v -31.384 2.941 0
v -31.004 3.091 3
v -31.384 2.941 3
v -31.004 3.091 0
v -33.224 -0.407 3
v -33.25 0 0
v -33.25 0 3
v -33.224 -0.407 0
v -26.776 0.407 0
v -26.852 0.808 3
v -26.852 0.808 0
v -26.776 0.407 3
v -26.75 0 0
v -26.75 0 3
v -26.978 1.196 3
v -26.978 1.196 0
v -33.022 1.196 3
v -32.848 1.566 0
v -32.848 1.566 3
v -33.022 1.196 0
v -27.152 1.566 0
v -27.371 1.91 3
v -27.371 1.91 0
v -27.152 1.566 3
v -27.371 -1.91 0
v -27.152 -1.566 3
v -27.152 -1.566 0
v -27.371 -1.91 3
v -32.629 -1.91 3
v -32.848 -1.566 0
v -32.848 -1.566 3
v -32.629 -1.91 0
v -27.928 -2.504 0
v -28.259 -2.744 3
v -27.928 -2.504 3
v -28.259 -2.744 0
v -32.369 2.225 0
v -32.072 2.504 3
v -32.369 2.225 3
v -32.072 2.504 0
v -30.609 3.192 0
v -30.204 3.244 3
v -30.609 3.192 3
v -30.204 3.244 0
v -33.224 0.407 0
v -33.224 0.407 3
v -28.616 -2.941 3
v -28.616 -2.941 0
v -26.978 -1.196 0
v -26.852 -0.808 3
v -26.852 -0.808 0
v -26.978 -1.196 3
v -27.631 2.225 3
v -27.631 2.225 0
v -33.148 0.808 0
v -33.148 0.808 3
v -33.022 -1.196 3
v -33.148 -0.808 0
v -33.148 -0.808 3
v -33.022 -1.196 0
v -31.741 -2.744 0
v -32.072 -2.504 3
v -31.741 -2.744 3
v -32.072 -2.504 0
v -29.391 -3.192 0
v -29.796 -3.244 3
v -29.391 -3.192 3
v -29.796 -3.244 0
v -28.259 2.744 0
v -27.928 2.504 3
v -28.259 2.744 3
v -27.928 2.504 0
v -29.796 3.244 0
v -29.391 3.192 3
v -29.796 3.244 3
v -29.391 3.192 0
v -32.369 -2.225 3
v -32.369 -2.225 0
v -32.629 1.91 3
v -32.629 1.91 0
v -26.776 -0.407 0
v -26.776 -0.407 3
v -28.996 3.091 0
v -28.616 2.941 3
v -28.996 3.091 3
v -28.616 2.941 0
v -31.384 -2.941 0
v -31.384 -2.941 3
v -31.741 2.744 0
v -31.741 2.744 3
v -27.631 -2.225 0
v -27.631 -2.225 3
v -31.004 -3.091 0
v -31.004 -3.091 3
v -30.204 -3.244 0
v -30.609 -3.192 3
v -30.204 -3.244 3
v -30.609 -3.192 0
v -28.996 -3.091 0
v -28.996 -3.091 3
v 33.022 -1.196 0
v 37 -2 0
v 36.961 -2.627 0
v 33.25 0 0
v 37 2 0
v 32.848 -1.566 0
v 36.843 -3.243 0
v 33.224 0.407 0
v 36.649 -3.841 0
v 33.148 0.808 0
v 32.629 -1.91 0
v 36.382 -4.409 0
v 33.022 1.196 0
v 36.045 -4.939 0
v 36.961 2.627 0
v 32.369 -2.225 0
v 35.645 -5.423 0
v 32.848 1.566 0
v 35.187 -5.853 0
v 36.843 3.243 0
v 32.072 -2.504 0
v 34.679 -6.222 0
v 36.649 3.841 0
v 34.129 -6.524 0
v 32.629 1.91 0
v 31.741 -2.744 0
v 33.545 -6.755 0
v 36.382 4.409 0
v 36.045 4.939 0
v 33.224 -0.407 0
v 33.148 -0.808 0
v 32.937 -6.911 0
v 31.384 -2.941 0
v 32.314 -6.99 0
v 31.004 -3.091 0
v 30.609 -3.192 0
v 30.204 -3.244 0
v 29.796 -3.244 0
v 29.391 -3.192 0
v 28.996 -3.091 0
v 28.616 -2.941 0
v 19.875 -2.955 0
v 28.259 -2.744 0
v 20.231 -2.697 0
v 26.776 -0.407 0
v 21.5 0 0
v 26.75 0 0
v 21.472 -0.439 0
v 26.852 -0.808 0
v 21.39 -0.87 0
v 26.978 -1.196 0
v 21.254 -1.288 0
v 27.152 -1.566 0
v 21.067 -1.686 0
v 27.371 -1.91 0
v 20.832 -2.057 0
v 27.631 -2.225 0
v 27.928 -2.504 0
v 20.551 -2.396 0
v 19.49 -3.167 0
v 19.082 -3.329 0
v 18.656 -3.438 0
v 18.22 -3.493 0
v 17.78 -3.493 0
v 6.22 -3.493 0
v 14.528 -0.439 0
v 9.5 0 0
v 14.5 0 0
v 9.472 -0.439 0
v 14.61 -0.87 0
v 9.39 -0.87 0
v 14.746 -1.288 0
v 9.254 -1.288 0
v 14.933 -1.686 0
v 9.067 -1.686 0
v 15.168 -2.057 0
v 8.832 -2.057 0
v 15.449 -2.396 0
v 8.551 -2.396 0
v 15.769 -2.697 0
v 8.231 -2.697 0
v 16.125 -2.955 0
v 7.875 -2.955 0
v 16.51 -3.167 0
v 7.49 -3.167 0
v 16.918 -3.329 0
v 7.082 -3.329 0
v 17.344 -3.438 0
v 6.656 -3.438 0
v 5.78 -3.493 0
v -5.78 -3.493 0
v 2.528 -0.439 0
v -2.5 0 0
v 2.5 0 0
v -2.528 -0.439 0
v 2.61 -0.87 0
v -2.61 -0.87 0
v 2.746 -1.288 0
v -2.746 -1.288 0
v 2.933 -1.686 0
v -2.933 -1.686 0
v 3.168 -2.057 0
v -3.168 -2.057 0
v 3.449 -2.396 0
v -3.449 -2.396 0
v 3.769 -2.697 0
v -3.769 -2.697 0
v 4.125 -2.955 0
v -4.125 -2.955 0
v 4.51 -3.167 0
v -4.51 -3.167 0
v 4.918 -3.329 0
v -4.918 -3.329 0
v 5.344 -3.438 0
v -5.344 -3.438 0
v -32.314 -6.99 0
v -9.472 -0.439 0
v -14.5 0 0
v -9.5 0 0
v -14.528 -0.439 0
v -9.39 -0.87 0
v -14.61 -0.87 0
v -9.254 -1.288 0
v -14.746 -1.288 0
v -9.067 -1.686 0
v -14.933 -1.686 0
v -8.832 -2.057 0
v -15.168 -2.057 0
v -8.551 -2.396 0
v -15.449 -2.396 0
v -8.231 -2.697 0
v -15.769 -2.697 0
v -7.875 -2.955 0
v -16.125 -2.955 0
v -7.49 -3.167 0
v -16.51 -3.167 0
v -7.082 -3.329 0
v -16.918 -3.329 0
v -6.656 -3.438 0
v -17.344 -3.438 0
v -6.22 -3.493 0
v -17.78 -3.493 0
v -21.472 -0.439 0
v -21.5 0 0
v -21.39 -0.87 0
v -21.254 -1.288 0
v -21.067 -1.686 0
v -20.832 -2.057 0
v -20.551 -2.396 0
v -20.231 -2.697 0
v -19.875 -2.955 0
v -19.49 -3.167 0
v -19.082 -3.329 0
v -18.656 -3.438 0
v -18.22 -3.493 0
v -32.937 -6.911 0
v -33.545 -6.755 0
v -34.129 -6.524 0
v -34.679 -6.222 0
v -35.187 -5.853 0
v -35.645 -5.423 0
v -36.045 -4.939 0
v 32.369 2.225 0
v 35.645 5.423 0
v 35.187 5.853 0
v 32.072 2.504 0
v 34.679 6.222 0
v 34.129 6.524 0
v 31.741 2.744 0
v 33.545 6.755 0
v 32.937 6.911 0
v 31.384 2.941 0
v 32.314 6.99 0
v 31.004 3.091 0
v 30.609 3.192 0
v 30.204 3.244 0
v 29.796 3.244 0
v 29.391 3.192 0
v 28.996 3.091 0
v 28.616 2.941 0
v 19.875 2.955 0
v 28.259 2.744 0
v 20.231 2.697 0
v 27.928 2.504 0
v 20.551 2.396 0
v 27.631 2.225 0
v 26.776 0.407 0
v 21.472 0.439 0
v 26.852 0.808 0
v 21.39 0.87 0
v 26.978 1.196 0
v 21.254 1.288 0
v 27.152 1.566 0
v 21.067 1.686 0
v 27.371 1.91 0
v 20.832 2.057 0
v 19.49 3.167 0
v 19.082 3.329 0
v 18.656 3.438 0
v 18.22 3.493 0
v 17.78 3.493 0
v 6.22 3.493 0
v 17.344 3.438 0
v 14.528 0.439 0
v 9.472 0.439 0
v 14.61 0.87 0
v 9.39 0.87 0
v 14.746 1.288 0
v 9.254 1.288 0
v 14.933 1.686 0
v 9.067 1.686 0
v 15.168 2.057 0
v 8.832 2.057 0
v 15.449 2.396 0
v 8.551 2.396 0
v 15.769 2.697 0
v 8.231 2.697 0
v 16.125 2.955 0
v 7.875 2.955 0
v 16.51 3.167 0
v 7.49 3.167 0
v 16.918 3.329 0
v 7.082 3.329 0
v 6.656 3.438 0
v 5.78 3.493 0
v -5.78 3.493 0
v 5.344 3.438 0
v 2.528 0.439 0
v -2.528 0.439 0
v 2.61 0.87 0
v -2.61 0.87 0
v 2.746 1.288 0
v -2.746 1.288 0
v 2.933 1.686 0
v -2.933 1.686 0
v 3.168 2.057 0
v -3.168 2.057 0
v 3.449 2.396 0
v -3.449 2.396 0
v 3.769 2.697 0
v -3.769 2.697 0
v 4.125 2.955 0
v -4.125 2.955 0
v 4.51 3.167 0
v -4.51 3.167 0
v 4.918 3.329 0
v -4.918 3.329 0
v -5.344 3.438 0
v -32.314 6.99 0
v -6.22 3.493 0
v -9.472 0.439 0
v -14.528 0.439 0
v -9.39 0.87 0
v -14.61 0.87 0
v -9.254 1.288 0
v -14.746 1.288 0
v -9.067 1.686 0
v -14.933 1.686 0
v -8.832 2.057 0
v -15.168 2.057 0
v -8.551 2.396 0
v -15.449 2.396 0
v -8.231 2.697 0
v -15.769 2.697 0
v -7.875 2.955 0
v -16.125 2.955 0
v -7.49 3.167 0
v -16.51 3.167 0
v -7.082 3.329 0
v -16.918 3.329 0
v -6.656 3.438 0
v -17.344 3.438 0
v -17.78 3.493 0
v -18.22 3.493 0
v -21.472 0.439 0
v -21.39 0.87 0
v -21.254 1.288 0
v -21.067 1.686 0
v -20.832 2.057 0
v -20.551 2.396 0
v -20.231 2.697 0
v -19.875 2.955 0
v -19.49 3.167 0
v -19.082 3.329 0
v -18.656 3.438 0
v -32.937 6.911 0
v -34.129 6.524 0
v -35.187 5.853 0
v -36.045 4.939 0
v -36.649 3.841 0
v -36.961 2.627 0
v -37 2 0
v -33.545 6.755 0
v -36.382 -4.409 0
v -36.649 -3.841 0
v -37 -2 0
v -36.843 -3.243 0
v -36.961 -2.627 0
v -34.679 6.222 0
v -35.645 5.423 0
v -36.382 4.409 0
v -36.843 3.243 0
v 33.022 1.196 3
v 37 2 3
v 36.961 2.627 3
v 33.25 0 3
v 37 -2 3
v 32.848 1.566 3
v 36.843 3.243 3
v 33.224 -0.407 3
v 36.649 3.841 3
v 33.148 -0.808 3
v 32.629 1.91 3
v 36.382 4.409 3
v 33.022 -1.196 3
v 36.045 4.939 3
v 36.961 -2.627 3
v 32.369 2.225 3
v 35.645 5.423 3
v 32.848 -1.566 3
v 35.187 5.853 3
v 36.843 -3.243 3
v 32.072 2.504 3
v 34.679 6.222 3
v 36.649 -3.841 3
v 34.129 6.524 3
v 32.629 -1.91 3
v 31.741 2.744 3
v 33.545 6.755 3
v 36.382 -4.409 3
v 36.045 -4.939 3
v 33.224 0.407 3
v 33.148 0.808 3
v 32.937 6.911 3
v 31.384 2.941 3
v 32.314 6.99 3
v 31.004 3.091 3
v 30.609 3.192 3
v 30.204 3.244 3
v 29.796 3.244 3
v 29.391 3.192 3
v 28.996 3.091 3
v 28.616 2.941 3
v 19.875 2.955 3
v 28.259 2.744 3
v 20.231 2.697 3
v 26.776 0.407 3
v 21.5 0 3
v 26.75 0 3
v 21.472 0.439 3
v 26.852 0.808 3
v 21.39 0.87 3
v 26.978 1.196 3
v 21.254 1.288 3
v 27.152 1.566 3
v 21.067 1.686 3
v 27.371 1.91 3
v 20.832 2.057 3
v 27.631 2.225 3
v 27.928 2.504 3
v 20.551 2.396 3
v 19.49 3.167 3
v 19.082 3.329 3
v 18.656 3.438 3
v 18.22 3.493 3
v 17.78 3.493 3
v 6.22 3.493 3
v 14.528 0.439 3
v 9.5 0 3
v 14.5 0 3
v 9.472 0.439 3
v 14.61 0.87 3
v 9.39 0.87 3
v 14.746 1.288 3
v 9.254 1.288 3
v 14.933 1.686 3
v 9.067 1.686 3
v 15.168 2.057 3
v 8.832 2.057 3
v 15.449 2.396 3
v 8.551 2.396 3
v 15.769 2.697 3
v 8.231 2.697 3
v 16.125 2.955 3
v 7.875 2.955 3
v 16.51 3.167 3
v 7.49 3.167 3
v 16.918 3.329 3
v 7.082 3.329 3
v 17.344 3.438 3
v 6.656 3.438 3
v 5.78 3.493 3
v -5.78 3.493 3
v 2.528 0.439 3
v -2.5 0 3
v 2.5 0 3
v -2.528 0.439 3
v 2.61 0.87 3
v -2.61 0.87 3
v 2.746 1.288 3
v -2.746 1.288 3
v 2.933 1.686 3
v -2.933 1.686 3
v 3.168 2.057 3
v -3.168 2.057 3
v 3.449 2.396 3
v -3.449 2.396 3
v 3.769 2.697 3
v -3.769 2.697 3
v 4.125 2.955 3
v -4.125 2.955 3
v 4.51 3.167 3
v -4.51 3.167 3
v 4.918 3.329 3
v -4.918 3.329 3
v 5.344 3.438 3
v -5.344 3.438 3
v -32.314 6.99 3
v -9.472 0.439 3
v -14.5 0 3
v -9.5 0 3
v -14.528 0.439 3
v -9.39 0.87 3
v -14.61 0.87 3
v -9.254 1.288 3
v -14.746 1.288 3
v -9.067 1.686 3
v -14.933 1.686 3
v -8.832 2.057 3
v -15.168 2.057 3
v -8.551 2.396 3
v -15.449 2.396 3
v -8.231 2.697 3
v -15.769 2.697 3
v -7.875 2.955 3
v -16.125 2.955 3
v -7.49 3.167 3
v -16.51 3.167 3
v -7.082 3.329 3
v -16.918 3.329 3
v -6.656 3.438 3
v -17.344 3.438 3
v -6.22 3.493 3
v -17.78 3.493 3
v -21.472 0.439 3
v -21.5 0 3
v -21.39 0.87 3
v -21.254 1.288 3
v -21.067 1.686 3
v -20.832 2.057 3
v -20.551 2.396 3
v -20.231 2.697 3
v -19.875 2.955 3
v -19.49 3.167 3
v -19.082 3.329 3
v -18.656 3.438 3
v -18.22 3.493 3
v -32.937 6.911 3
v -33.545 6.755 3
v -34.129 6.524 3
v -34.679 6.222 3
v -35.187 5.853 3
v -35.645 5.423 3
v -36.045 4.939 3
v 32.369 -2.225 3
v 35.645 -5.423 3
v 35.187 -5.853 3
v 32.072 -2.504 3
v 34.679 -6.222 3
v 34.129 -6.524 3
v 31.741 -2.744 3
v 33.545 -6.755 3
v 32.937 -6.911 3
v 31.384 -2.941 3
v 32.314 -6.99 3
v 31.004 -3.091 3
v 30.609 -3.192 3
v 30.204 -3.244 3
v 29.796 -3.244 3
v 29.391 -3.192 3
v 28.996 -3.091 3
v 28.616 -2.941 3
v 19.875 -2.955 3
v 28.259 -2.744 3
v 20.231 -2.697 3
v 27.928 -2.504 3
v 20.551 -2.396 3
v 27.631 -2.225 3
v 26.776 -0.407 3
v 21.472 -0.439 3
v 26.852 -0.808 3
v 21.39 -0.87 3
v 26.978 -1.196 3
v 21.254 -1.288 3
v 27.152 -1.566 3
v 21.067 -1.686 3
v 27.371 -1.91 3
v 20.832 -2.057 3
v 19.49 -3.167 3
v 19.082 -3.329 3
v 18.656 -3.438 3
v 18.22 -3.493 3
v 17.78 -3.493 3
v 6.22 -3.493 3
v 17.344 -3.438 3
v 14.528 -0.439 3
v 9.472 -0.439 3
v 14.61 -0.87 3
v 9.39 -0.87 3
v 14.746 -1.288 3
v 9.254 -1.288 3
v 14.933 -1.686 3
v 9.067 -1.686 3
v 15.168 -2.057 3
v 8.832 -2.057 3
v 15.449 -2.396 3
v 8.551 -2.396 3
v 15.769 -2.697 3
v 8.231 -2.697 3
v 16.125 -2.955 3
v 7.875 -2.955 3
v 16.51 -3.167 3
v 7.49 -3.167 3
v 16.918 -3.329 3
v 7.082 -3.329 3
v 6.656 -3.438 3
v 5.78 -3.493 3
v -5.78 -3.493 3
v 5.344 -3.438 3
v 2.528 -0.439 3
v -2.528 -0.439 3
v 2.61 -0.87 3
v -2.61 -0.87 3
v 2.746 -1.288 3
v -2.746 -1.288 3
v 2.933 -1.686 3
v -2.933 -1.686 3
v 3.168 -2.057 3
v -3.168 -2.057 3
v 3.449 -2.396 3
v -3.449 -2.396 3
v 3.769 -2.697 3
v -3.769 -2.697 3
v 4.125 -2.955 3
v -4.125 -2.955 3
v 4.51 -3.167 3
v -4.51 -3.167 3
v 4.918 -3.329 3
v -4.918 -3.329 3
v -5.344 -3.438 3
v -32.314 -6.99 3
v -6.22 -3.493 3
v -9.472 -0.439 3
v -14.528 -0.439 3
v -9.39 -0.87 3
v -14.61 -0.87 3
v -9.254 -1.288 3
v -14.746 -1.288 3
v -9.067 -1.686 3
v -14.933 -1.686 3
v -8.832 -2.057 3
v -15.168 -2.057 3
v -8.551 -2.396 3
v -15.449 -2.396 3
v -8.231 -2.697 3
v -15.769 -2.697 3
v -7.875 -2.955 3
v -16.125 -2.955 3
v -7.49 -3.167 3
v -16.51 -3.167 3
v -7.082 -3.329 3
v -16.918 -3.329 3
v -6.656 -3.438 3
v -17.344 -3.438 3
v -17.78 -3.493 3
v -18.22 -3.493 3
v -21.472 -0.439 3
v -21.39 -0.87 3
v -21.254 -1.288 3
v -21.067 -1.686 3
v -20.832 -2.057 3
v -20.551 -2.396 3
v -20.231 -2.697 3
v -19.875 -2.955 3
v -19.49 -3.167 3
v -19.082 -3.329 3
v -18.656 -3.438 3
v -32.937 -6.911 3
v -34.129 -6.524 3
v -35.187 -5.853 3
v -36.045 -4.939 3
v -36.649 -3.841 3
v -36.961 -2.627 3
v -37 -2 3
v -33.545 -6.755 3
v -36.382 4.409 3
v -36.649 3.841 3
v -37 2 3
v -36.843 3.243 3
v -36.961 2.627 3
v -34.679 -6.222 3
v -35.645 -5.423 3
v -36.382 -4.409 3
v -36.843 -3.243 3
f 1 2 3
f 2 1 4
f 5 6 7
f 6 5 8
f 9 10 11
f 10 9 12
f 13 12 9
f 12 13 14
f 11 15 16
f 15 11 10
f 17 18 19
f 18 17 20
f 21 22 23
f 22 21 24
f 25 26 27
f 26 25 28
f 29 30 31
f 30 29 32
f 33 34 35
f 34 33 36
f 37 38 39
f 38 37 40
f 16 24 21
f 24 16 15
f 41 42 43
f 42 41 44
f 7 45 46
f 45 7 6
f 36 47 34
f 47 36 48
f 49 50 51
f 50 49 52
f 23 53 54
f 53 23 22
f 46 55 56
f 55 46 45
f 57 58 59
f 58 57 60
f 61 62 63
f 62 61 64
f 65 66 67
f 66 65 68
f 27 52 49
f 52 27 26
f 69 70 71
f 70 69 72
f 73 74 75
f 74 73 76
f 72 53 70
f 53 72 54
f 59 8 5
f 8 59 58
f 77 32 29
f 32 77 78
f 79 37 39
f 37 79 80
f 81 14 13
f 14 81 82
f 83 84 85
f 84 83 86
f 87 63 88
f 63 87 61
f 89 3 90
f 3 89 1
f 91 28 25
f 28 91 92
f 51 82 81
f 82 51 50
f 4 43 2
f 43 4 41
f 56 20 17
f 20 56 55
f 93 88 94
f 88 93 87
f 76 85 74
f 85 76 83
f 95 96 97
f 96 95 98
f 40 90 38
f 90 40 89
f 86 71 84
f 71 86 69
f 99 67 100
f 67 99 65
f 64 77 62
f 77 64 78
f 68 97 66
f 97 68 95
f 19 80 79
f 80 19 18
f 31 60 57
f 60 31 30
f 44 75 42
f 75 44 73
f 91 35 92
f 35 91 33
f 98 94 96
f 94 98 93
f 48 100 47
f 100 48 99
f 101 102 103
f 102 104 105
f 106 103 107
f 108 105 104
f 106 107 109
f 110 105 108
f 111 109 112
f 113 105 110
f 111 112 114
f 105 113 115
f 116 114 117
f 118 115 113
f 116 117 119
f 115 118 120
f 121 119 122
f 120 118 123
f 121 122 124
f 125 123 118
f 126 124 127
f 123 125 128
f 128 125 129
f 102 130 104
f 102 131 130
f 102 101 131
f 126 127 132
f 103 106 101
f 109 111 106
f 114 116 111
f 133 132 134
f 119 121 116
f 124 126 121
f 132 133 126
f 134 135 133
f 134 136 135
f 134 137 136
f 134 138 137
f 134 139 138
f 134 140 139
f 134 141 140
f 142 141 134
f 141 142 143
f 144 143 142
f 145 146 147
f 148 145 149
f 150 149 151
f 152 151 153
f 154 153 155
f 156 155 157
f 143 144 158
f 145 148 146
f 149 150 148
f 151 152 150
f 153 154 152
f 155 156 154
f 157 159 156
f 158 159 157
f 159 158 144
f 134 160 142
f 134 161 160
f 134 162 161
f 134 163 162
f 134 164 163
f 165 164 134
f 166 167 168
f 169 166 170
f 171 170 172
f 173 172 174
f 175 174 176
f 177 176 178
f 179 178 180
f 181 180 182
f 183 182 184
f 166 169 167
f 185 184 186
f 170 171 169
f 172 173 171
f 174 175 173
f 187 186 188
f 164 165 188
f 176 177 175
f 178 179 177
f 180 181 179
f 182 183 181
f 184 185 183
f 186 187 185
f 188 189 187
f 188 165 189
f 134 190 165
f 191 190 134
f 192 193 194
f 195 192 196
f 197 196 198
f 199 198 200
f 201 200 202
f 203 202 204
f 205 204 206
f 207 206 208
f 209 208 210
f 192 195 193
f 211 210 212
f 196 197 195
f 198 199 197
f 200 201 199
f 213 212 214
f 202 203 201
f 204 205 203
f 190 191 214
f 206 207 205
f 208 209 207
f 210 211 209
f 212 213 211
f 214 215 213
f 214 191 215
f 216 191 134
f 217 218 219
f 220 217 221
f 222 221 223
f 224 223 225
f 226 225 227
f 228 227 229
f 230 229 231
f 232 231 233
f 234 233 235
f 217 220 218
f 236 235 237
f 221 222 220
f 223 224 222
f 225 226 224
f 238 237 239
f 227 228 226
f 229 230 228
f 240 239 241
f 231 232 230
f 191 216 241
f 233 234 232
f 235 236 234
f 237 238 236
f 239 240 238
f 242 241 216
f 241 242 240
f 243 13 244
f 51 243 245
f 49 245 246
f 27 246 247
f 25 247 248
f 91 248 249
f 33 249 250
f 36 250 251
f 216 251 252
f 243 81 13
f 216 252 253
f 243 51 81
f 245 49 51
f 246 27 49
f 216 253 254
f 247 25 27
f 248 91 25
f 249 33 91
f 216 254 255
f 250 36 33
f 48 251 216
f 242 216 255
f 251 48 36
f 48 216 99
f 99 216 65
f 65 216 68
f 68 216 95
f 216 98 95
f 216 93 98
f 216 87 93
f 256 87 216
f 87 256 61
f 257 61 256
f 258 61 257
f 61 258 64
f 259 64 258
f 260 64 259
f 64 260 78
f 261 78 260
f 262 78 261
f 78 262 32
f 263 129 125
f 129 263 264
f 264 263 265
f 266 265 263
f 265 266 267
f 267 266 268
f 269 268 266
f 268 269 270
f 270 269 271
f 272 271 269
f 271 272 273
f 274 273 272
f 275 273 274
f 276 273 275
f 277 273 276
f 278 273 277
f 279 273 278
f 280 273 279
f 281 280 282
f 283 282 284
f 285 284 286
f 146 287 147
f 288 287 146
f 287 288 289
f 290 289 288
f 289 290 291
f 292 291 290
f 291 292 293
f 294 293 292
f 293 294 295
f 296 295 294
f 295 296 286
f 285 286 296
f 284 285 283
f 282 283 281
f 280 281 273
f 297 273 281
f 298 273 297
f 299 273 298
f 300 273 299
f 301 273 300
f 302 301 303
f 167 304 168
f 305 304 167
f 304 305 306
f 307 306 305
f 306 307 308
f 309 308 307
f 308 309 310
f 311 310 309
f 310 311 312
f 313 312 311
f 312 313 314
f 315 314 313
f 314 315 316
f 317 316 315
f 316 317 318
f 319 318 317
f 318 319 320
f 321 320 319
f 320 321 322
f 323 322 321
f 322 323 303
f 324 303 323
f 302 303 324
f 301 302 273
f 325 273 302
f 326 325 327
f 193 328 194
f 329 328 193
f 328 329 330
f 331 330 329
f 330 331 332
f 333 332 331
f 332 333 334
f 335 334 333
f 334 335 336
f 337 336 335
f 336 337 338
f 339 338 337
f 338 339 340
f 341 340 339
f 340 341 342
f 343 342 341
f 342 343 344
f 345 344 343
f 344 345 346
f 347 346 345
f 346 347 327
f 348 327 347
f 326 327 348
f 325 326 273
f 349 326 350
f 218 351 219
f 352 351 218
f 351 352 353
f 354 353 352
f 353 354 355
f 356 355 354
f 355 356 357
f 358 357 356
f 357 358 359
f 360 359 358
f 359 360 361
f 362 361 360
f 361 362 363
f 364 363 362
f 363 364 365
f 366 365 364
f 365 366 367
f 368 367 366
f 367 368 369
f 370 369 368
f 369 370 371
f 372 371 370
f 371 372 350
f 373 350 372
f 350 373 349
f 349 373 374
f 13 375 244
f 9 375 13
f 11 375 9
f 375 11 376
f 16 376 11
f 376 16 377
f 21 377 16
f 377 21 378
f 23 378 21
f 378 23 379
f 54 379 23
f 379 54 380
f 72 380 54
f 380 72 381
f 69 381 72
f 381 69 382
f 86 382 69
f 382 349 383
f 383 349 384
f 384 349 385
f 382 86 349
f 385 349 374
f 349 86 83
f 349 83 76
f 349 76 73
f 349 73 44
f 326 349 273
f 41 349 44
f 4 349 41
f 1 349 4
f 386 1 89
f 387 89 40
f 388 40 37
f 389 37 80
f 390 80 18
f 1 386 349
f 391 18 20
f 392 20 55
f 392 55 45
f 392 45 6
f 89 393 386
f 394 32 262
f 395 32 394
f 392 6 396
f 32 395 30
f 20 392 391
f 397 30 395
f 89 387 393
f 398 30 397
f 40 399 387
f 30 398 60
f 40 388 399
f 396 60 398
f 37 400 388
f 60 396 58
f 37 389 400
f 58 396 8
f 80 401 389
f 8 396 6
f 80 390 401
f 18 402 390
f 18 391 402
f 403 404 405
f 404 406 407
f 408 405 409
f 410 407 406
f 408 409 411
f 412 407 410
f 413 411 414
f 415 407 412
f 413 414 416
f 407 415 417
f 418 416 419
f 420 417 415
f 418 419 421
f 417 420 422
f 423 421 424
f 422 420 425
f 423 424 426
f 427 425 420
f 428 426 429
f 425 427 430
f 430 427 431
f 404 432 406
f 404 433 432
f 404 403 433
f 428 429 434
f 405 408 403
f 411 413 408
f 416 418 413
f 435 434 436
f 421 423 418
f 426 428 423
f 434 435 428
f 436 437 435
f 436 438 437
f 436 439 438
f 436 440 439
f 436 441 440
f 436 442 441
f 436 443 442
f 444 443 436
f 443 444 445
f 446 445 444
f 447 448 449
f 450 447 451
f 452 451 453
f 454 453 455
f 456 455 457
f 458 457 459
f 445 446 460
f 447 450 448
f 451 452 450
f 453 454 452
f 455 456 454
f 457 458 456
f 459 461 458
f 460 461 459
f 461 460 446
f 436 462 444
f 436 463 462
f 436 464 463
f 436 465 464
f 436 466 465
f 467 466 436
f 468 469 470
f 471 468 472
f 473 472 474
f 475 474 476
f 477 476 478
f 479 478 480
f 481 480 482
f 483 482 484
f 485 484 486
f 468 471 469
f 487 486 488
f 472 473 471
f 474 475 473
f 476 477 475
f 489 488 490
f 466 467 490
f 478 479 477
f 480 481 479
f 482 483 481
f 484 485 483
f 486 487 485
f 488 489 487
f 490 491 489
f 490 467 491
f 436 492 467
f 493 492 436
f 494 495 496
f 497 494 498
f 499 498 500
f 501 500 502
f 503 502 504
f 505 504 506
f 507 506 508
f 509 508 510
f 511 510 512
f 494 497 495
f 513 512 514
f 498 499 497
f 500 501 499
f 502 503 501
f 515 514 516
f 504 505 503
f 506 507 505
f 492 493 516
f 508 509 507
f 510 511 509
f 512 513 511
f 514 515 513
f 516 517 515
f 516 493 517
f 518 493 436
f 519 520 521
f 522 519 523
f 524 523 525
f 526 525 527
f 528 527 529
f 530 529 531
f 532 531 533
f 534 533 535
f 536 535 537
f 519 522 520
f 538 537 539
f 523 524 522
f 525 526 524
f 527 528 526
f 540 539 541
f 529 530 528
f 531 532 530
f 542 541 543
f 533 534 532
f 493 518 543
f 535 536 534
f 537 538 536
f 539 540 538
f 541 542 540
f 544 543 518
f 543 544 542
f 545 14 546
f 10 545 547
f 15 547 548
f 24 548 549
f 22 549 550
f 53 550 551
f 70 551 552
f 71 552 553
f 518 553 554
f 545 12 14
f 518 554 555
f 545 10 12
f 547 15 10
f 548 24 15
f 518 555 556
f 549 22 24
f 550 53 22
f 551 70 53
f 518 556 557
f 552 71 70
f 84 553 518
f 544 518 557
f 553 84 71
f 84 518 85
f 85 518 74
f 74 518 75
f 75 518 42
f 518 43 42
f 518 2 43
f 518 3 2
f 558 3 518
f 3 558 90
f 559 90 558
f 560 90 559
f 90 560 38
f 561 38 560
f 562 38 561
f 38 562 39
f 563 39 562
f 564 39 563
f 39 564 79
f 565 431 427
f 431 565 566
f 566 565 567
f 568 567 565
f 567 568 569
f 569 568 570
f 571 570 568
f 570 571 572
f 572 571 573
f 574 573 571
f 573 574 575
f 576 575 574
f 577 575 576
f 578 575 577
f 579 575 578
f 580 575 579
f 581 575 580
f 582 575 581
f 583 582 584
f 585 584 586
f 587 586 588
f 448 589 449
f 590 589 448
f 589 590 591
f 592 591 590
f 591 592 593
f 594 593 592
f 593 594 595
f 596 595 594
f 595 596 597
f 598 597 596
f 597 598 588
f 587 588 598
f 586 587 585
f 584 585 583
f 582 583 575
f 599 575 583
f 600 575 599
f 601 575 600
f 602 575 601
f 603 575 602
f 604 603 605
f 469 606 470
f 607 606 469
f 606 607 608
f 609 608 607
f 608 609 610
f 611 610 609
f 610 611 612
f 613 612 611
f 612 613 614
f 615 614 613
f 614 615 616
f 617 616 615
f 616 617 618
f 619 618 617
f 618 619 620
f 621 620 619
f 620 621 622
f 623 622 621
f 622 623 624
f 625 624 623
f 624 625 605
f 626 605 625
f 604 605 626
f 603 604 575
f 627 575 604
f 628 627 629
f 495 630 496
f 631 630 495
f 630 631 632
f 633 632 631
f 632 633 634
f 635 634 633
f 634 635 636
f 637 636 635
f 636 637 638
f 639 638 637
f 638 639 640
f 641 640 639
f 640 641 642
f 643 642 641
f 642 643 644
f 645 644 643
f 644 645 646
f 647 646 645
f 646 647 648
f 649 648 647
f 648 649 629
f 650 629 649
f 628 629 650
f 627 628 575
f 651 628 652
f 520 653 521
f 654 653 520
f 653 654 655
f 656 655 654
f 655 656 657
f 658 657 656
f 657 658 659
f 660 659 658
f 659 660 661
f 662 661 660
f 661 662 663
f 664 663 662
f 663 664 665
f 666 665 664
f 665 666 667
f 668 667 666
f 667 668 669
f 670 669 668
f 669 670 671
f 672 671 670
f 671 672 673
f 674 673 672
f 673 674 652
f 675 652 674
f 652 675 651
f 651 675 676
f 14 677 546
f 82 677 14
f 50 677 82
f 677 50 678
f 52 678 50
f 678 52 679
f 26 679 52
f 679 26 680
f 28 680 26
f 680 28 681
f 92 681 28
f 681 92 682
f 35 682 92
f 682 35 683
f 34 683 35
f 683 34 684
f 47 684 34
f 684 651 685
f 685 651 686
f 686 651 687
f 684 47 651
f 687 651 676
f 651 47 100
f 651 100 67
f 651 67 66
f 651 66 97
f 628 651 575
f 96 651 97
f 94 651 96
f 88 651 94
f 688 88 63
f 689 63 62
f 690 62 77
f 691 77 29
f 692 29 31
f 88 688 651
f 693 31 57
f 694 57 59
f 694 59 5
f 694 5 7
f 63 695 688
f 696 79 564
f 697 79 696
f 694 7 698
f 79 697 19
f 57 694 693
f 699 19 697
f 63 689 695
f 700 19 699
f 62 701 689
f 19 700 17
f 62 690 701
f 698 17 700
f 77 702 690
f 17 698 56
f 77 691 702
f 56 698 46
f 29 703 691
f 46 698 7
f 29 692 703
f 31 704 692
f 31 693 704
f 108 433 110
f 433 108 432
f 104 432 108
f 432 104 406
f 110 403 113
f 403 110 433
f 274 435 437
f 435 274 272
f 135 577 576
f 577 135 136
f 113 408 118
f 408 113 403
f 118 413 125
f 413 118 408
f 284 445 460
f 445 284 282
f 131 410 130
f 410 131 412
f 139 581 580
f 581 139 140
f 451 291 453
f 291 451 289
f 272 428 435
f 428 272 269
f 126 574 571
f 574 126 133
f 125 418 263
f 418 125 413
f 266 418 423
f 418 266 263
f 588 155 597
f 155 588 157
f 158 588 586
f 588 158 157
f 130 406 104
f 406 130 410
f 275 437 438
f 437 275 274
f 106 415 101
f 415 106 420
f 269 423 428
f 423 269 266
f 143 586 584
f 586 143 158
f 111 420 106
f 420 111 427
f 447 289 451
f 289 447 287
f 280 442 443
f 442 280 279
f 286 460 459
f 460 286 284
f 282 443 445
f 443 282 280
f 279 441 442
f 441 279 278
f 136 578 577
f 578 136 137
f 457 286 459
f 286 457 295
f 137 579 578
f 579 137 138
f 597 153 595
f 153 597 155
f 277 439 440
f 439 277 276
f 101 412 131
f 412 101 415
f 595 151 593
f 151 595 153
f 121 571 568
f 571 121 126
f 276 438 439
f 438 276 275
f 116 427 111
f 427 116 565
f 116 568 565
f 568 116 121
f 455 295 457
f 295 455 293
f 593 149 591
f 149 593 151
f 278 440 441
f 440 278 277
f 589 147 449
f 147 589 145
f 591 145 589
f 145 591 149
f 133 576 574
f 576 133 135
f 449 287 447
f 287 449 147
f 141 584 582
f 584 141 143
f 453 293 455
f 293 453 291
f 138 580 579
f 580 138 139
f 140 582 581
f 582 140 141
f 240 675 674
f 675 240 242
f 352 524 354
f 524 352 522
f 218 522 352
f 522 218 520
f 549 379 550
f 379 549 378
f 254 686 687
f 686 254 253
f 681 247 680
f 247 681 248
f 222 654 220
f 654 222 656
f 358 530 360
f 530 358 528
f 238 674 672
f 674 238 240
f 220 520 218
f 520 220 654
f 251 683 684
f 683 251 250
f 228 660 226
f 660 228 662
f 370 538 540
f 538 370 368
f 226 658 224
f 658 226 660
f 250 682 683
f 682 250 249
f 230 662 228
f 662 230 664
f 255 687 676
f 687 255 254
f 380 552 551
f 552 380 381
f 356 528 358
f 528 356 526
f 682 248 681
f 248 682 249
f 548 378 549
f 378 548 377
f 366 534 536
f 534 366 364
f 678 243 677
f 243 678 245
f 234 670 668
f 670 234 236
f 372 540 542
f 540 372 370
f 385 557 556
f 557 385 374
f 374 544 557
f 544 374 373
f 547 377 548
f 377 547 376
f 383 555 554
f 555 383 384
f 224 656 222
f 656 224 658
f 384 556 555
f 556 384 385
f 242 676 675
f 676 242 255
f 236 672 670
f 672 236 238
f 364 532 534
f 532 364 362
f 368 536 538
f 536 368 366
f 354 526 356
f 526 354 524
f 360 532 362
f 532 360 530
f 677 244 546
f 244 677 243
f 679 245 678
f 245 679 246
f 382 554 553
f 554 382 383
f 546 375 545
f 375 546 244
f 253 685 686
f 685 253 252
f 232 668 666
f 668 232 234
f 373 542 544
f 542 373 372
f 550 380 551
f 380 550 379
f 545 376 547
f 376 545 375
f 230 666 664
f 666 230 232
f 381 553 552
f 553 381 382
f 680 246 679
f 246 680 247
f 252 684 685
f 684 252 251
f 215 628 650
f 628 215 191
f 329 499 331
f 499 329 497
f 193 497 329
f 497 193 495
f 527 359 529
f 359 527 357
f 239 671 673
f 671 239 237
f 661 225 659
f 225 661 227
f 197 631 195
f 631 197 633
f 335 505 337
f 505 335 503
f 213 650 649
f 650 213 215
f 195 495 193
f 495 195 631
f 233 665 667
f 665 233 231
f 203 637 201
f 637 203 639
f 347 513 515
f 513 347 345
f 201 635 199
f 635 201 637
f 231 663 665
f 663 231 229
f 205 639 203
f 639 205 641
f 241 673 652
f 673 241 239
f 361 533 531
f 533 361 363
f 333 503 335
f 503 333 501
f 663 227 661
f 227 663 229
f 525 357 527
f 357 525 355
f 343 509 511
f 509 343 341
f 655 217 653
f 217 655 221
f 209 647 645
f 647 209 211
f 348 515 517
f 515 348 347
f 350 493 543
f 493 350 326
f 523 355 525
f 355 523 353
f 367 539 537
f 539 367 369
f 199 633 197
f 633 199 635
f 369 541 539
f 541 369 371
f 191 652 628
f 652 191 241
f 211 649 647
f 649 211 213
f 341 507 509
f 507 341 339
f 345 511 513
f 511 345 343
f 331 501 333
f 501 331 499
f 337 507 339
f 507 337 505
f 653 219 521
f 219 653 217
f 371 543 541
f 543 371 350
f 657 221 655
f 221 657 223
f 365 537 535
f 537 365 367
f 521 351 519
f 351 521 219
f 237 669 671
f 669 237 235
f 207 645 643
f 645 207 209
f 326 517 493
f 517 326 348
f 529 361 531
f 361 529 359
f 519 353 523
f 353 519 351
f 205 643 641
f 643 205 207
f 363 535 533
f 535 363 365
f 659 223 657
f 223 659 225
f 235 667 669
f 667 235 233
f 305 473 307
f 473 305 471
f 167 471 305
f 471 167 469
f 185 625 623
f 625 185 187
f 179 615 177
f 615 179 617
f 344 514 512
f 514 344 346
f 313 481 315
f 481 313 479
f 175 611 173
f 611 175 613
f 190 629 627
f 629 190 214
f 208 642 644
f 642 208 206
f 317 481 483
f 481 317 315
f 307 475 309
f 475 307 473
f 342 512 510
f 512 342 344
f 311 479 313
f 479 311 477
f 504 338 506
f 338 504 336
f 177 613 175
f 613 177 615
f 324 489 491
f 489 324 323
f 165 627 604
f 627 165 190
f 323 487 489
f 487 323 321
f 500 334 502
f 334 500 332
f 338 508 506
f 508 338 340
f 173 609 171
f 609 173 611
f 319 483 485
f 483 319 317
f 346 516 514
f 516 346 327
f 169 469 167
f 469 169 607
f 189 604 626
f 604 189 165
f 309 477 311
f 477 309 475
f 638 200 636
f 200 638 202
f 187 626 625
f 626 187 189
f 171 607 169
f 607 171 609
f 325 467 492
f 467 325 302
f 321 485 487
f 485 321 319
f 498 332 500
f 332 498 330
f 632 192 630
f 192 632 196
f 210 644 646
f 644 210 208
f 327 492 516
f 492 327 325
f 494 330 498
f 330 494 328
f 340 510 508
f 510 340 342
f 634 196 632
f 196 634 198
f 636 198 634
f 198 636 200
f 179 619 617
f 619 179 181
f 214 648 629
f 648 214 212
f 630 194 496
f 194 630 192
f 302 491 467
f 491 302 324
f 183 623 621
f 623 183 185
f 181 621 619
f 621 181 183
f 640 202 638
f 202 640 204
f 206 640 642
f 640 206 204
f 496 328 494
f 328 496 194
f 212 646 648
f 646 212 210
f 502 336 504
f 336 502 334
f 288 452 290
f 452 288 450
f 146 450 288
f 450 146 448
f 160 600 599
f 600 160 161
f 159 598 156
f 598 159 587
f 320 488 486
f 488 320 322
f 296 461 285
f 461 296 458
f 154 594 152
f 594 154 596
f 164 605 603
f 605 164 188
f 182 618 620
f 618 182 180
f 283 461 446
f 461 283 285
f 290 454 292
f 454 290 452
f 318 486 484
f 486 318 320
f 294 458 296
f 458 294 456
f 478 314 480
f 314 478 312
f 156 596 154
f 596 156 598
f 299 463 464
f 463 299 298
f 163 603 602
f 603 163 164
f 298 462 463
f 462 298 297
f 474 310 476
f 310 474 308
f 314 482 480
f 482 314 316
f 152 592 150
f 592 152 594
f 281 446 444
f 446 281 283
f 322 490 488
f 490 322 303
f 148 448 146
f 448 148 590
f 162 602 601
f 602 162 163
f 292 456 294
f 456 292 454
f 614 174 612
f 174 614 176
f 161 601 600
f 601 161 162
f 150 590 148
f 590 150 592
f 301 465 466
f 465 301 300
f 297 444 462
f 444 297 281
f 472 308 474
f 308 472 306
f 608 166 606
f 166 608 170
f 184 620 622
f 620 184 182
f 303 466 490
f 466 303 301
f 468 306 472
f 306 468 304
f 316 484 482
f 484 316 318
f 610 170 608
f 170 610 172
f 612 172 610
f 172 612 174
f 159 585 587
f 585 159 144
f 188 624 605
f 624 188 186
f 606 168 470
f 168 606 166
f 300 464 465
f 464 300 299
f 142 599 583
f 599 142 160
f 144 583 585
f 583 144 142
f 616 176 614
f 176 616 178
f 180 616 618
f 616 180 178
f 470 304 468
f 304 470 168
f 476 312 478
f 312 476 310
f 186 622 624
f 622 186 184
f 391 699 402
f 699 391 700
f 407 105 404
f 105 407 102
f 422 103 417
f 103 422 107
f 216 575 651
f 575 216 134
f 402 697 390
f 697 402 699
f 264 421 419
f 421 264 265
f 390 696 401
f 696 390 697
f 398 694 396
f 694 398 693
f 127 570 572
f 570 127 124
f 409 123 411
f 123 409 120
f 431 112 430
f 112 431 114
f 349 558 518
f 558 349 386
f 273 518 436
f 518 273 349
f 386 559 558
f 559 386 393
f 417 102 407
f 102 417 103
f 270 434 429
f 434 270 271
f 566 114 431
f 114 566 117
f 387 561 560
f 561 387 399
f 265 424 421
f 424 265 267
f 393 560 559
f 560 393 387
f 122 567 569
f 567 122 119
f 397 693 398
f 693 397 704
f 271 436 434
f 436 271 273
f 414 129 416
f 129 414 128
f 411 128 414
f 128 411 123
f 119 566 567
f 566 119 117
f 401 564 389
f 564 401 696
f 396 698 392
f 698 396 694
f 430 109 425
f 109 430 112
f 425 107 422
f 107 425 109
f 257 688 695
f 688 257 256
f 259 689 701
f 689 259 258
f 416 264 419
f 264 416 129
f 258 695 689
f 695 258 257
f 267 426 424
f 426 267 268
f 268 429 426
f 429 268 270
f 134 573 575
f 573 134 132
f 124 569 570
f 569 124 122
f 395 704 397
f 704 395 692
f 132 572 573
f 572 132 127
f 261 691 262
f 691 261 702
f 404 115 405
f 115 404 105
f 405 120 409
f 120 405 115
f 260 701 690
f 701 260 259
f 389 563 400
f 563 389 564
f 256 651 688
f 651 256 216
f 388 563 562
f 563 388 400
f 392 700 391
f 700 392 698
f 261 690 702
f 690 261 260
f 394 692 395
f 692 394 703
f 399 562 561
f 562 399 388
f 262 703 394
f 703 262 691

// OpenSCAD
$fn = 50;

difference() {
	union() {
		hull() {
			translate(v = [-32.0, 2.0, 0]) {
				cylinder(h = 3, r = 5);
			}
			translate(v = [32.0, 2.0, 0]) {
				cylinder(h = 3, r = 5);
			}
			translate(v = [-32.0, -2.0, 0]) {
				cylinder(h = 3, r = 5);
			}
			translate(v = [32.0, -2.0, 0]) {
				cylinder(h = 3, r = 5);
			}
		}
	}
	union() {
		translate(v = [-30.0, 0.0, 0]) {
			cylinder(h = 3, r = 3.25);
		}
		translate(v = [30.0, 0.0, 0]) {
			cylinder(h = 3, r = 3.25);
		}
		translate(v = [-18.0, 0, 0.0]) {
			cylinder(h = 3, r = 3.5);
		}
		translate(v = [-6.0, 0, 0.0]) {
			cylinder(h = 3, r = 3.5);
		}
		translate(v = [6.0, 0, 0.0]) {
			cylinder(h = 3, r = 3.5);
		}
		translate(v = [18.0, 0, 0.0]) {
			cylinder(h = 3, r = 3.5);
		}
	}
}
